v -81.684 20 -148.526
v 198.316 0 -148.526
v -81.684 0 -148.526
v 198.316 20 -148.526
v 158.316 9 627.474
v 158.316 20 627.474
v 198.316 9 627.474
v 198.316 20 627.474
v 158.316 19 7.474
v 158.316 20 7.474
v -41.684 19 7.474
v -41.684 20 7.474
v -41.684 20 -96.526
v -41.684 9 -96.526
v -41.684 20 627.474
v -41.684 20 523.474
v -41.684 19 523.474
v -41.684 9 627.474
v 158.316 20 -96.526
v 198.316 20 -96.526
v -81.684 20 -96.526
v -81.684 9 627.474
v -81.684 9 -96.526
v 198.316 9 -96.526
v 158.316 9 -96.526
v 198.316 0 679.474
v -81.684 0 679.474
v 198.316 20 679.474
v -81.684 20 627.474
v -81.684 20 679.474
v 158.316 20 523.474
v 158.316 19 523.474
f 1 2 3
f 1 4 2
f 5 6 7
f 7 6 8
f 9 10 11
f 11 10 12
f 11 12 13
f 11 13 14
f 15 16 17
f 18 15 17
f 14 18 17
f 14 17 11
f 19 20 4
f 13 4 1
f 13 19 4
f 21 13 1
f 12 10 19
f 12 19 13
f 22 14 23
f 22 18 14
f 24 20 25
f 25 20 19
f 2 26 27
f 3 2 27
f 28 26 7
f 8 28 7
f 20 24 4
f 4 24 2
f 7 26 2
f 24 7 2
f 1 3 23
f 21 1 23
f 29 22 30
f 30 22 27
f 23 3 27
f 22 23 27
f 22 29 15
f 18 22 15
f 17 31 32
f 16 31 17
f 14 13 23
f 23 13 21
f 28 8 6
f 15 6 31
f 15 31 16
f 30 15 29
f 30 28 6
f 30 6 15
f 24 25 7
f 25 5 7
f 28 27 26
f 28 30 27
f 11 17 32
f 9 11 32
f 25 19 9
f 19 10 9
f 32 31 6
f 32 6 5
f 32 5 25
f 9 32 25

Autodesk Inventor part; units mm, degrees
ref_plane "YZ Plane" through (0, 0, 0) normal (1, 0, 0) x (0, 1, 0)
ref_plane "XZ Plane" through (0, 0, 0) normal (0, 1, 0) x (-1, 0, 0)
ref_plane "XY Plane" through (0, 0, 0) normal (0, 0, 1) x (1, 0, 0)
sketch "Эскиз1" plane through (0, 0, 0) normal (0, 1, 0) x (-1, 0, 0)
  line L0 (81.6842, 653.4737) -> (-198.3158, 653.4737)
  line L1 (-198.3158, 653.4737) -> (-198.3158, -122.5263)
  line L2 (-198.3158, -122.5263) -> (81.6842, -122.5263)
  line L3 (81.6842, -122.5263) -> (81.6842, 653.4737)
  point P0 (0, 0)
  dimension "d0" = 776
  dimension "d1" = 280
extrude "Выдавливание1" add sketch "Эскиз1" along normal blind 20
sketch "Эскиз3" plane through (-81.6842, 0, 653.4737) normal (0, 0, 1) x (1, 0, 0)
  line L0 (292, 31) -> (240, 31)
  line L1 (240, 31) -> (240, 9)
  line L2 (240, 9) -> (292, 9)
  line L3 (292, 9) -> (292, 31)
  line L4 (0, 0) -> (280, 0) projected
  line L5 (280, 0) -> (280, 20) projected
  line L6 (-1, 23) -> (40, 23)
  line L7 (40, 23) -> (40, 9)
  line L8 (40, 9) -> (-1, 9)
  line L9 (-1, 9) -> (-1, 23)
  line L10 (0, 0) -> (0, 20) projected
  point P0 (81.6842, 0)
  dimension "d4" = 9
  dimension "d5" = 40
  dimension "d6" = 9
  dimension "d7" = 40
extrude "Выдавливание2" cut sketch "Эскиз3" against normal blind 999
sketch "Эскиз4" plane through (-81.6842, 0, 653.4737) normal (0, 0, 1) x (1, 0, 0)
  point P0 (81.6842, 0)
sketch "Эскиз5" plane through (-81.6842, 0, 653.4737) normal (0, 0, 1) x (1, 0, 0)
  line L0 (280, 0) -> (280, 9) projected
  line L1 (280, 0) -> (0, 0)
  line L2 (0, 0) -> (0, 20)
  line L3 (0, 20) -> (280, 20)
  line L4 (280, 20) -> (280, 0)
  point P0 (81.6842, 0)
  dimension "d18" = 20
extrude "Выдавливание3" add sketch "Эскиз5" along normal mid plane 52
sketch "Эскиз6" plane through (198.3158, 0, -122.5263) normal (0, 0, -1) x (-1, 0, 0)
  line L0 (0, 0) -> (280, 0) projected
  line L1 (0, 20) -> (0, 9) projected
  line L2 (280, 0) -> (0, 0)
  line L3 (0, 0) -> (0, 20)
  line L4 (0, 20) -> (280, 20)
  line L5 (280, 20) -> (280, 0)
  point P0 (198.3158, 0)
  point P1 (0, 9)
extrude "Выдавливание4" add sketch "Эскиз6" along normal mid plane 52
sketch "Эскиз7" plane through (0, 20, 0) normal (0, 1, 0) x (1, 0, 0)
  line L0 (-81.6842, -627.4737) -> (198.3158, -627.4737) projected
  line L1 (198.3158, 96.5263) -> (-81.6842, 96.5263) projected
  line L2 (198.3158, 96.5263) -> (198.3158, -627.4737) projected
  line L3 (-149.6842, -265.4737) -> (289, -265.4737)
  line L4 (289, -265.4737) -> (289, -7.4737)
  line L5 (289, -7.4737) -> (-149.6842, -7.4737)
  line L6 (-149.6842, -7.4737) -> (-149.6842, -265.4737)
  line L7 (-149.6842, -265.4737) -> (289, -265.4737)
  line L8 (289, -265.4737) -> (289, -523.4737)
  line L9 (289, -523.4737) -> (-149.6842, -523.4737)
  line L10 (-149.6842, -523.4737) -> (-149.6842, -265.4737)
  point P0 (0, 0)
  dimension "d14" = 258
  dimension "d15" = 258
extrude "Выдавливание5" cut sketch "Эскиз7" against normal blind 1
properties part number "NizFlanecX_ax"
